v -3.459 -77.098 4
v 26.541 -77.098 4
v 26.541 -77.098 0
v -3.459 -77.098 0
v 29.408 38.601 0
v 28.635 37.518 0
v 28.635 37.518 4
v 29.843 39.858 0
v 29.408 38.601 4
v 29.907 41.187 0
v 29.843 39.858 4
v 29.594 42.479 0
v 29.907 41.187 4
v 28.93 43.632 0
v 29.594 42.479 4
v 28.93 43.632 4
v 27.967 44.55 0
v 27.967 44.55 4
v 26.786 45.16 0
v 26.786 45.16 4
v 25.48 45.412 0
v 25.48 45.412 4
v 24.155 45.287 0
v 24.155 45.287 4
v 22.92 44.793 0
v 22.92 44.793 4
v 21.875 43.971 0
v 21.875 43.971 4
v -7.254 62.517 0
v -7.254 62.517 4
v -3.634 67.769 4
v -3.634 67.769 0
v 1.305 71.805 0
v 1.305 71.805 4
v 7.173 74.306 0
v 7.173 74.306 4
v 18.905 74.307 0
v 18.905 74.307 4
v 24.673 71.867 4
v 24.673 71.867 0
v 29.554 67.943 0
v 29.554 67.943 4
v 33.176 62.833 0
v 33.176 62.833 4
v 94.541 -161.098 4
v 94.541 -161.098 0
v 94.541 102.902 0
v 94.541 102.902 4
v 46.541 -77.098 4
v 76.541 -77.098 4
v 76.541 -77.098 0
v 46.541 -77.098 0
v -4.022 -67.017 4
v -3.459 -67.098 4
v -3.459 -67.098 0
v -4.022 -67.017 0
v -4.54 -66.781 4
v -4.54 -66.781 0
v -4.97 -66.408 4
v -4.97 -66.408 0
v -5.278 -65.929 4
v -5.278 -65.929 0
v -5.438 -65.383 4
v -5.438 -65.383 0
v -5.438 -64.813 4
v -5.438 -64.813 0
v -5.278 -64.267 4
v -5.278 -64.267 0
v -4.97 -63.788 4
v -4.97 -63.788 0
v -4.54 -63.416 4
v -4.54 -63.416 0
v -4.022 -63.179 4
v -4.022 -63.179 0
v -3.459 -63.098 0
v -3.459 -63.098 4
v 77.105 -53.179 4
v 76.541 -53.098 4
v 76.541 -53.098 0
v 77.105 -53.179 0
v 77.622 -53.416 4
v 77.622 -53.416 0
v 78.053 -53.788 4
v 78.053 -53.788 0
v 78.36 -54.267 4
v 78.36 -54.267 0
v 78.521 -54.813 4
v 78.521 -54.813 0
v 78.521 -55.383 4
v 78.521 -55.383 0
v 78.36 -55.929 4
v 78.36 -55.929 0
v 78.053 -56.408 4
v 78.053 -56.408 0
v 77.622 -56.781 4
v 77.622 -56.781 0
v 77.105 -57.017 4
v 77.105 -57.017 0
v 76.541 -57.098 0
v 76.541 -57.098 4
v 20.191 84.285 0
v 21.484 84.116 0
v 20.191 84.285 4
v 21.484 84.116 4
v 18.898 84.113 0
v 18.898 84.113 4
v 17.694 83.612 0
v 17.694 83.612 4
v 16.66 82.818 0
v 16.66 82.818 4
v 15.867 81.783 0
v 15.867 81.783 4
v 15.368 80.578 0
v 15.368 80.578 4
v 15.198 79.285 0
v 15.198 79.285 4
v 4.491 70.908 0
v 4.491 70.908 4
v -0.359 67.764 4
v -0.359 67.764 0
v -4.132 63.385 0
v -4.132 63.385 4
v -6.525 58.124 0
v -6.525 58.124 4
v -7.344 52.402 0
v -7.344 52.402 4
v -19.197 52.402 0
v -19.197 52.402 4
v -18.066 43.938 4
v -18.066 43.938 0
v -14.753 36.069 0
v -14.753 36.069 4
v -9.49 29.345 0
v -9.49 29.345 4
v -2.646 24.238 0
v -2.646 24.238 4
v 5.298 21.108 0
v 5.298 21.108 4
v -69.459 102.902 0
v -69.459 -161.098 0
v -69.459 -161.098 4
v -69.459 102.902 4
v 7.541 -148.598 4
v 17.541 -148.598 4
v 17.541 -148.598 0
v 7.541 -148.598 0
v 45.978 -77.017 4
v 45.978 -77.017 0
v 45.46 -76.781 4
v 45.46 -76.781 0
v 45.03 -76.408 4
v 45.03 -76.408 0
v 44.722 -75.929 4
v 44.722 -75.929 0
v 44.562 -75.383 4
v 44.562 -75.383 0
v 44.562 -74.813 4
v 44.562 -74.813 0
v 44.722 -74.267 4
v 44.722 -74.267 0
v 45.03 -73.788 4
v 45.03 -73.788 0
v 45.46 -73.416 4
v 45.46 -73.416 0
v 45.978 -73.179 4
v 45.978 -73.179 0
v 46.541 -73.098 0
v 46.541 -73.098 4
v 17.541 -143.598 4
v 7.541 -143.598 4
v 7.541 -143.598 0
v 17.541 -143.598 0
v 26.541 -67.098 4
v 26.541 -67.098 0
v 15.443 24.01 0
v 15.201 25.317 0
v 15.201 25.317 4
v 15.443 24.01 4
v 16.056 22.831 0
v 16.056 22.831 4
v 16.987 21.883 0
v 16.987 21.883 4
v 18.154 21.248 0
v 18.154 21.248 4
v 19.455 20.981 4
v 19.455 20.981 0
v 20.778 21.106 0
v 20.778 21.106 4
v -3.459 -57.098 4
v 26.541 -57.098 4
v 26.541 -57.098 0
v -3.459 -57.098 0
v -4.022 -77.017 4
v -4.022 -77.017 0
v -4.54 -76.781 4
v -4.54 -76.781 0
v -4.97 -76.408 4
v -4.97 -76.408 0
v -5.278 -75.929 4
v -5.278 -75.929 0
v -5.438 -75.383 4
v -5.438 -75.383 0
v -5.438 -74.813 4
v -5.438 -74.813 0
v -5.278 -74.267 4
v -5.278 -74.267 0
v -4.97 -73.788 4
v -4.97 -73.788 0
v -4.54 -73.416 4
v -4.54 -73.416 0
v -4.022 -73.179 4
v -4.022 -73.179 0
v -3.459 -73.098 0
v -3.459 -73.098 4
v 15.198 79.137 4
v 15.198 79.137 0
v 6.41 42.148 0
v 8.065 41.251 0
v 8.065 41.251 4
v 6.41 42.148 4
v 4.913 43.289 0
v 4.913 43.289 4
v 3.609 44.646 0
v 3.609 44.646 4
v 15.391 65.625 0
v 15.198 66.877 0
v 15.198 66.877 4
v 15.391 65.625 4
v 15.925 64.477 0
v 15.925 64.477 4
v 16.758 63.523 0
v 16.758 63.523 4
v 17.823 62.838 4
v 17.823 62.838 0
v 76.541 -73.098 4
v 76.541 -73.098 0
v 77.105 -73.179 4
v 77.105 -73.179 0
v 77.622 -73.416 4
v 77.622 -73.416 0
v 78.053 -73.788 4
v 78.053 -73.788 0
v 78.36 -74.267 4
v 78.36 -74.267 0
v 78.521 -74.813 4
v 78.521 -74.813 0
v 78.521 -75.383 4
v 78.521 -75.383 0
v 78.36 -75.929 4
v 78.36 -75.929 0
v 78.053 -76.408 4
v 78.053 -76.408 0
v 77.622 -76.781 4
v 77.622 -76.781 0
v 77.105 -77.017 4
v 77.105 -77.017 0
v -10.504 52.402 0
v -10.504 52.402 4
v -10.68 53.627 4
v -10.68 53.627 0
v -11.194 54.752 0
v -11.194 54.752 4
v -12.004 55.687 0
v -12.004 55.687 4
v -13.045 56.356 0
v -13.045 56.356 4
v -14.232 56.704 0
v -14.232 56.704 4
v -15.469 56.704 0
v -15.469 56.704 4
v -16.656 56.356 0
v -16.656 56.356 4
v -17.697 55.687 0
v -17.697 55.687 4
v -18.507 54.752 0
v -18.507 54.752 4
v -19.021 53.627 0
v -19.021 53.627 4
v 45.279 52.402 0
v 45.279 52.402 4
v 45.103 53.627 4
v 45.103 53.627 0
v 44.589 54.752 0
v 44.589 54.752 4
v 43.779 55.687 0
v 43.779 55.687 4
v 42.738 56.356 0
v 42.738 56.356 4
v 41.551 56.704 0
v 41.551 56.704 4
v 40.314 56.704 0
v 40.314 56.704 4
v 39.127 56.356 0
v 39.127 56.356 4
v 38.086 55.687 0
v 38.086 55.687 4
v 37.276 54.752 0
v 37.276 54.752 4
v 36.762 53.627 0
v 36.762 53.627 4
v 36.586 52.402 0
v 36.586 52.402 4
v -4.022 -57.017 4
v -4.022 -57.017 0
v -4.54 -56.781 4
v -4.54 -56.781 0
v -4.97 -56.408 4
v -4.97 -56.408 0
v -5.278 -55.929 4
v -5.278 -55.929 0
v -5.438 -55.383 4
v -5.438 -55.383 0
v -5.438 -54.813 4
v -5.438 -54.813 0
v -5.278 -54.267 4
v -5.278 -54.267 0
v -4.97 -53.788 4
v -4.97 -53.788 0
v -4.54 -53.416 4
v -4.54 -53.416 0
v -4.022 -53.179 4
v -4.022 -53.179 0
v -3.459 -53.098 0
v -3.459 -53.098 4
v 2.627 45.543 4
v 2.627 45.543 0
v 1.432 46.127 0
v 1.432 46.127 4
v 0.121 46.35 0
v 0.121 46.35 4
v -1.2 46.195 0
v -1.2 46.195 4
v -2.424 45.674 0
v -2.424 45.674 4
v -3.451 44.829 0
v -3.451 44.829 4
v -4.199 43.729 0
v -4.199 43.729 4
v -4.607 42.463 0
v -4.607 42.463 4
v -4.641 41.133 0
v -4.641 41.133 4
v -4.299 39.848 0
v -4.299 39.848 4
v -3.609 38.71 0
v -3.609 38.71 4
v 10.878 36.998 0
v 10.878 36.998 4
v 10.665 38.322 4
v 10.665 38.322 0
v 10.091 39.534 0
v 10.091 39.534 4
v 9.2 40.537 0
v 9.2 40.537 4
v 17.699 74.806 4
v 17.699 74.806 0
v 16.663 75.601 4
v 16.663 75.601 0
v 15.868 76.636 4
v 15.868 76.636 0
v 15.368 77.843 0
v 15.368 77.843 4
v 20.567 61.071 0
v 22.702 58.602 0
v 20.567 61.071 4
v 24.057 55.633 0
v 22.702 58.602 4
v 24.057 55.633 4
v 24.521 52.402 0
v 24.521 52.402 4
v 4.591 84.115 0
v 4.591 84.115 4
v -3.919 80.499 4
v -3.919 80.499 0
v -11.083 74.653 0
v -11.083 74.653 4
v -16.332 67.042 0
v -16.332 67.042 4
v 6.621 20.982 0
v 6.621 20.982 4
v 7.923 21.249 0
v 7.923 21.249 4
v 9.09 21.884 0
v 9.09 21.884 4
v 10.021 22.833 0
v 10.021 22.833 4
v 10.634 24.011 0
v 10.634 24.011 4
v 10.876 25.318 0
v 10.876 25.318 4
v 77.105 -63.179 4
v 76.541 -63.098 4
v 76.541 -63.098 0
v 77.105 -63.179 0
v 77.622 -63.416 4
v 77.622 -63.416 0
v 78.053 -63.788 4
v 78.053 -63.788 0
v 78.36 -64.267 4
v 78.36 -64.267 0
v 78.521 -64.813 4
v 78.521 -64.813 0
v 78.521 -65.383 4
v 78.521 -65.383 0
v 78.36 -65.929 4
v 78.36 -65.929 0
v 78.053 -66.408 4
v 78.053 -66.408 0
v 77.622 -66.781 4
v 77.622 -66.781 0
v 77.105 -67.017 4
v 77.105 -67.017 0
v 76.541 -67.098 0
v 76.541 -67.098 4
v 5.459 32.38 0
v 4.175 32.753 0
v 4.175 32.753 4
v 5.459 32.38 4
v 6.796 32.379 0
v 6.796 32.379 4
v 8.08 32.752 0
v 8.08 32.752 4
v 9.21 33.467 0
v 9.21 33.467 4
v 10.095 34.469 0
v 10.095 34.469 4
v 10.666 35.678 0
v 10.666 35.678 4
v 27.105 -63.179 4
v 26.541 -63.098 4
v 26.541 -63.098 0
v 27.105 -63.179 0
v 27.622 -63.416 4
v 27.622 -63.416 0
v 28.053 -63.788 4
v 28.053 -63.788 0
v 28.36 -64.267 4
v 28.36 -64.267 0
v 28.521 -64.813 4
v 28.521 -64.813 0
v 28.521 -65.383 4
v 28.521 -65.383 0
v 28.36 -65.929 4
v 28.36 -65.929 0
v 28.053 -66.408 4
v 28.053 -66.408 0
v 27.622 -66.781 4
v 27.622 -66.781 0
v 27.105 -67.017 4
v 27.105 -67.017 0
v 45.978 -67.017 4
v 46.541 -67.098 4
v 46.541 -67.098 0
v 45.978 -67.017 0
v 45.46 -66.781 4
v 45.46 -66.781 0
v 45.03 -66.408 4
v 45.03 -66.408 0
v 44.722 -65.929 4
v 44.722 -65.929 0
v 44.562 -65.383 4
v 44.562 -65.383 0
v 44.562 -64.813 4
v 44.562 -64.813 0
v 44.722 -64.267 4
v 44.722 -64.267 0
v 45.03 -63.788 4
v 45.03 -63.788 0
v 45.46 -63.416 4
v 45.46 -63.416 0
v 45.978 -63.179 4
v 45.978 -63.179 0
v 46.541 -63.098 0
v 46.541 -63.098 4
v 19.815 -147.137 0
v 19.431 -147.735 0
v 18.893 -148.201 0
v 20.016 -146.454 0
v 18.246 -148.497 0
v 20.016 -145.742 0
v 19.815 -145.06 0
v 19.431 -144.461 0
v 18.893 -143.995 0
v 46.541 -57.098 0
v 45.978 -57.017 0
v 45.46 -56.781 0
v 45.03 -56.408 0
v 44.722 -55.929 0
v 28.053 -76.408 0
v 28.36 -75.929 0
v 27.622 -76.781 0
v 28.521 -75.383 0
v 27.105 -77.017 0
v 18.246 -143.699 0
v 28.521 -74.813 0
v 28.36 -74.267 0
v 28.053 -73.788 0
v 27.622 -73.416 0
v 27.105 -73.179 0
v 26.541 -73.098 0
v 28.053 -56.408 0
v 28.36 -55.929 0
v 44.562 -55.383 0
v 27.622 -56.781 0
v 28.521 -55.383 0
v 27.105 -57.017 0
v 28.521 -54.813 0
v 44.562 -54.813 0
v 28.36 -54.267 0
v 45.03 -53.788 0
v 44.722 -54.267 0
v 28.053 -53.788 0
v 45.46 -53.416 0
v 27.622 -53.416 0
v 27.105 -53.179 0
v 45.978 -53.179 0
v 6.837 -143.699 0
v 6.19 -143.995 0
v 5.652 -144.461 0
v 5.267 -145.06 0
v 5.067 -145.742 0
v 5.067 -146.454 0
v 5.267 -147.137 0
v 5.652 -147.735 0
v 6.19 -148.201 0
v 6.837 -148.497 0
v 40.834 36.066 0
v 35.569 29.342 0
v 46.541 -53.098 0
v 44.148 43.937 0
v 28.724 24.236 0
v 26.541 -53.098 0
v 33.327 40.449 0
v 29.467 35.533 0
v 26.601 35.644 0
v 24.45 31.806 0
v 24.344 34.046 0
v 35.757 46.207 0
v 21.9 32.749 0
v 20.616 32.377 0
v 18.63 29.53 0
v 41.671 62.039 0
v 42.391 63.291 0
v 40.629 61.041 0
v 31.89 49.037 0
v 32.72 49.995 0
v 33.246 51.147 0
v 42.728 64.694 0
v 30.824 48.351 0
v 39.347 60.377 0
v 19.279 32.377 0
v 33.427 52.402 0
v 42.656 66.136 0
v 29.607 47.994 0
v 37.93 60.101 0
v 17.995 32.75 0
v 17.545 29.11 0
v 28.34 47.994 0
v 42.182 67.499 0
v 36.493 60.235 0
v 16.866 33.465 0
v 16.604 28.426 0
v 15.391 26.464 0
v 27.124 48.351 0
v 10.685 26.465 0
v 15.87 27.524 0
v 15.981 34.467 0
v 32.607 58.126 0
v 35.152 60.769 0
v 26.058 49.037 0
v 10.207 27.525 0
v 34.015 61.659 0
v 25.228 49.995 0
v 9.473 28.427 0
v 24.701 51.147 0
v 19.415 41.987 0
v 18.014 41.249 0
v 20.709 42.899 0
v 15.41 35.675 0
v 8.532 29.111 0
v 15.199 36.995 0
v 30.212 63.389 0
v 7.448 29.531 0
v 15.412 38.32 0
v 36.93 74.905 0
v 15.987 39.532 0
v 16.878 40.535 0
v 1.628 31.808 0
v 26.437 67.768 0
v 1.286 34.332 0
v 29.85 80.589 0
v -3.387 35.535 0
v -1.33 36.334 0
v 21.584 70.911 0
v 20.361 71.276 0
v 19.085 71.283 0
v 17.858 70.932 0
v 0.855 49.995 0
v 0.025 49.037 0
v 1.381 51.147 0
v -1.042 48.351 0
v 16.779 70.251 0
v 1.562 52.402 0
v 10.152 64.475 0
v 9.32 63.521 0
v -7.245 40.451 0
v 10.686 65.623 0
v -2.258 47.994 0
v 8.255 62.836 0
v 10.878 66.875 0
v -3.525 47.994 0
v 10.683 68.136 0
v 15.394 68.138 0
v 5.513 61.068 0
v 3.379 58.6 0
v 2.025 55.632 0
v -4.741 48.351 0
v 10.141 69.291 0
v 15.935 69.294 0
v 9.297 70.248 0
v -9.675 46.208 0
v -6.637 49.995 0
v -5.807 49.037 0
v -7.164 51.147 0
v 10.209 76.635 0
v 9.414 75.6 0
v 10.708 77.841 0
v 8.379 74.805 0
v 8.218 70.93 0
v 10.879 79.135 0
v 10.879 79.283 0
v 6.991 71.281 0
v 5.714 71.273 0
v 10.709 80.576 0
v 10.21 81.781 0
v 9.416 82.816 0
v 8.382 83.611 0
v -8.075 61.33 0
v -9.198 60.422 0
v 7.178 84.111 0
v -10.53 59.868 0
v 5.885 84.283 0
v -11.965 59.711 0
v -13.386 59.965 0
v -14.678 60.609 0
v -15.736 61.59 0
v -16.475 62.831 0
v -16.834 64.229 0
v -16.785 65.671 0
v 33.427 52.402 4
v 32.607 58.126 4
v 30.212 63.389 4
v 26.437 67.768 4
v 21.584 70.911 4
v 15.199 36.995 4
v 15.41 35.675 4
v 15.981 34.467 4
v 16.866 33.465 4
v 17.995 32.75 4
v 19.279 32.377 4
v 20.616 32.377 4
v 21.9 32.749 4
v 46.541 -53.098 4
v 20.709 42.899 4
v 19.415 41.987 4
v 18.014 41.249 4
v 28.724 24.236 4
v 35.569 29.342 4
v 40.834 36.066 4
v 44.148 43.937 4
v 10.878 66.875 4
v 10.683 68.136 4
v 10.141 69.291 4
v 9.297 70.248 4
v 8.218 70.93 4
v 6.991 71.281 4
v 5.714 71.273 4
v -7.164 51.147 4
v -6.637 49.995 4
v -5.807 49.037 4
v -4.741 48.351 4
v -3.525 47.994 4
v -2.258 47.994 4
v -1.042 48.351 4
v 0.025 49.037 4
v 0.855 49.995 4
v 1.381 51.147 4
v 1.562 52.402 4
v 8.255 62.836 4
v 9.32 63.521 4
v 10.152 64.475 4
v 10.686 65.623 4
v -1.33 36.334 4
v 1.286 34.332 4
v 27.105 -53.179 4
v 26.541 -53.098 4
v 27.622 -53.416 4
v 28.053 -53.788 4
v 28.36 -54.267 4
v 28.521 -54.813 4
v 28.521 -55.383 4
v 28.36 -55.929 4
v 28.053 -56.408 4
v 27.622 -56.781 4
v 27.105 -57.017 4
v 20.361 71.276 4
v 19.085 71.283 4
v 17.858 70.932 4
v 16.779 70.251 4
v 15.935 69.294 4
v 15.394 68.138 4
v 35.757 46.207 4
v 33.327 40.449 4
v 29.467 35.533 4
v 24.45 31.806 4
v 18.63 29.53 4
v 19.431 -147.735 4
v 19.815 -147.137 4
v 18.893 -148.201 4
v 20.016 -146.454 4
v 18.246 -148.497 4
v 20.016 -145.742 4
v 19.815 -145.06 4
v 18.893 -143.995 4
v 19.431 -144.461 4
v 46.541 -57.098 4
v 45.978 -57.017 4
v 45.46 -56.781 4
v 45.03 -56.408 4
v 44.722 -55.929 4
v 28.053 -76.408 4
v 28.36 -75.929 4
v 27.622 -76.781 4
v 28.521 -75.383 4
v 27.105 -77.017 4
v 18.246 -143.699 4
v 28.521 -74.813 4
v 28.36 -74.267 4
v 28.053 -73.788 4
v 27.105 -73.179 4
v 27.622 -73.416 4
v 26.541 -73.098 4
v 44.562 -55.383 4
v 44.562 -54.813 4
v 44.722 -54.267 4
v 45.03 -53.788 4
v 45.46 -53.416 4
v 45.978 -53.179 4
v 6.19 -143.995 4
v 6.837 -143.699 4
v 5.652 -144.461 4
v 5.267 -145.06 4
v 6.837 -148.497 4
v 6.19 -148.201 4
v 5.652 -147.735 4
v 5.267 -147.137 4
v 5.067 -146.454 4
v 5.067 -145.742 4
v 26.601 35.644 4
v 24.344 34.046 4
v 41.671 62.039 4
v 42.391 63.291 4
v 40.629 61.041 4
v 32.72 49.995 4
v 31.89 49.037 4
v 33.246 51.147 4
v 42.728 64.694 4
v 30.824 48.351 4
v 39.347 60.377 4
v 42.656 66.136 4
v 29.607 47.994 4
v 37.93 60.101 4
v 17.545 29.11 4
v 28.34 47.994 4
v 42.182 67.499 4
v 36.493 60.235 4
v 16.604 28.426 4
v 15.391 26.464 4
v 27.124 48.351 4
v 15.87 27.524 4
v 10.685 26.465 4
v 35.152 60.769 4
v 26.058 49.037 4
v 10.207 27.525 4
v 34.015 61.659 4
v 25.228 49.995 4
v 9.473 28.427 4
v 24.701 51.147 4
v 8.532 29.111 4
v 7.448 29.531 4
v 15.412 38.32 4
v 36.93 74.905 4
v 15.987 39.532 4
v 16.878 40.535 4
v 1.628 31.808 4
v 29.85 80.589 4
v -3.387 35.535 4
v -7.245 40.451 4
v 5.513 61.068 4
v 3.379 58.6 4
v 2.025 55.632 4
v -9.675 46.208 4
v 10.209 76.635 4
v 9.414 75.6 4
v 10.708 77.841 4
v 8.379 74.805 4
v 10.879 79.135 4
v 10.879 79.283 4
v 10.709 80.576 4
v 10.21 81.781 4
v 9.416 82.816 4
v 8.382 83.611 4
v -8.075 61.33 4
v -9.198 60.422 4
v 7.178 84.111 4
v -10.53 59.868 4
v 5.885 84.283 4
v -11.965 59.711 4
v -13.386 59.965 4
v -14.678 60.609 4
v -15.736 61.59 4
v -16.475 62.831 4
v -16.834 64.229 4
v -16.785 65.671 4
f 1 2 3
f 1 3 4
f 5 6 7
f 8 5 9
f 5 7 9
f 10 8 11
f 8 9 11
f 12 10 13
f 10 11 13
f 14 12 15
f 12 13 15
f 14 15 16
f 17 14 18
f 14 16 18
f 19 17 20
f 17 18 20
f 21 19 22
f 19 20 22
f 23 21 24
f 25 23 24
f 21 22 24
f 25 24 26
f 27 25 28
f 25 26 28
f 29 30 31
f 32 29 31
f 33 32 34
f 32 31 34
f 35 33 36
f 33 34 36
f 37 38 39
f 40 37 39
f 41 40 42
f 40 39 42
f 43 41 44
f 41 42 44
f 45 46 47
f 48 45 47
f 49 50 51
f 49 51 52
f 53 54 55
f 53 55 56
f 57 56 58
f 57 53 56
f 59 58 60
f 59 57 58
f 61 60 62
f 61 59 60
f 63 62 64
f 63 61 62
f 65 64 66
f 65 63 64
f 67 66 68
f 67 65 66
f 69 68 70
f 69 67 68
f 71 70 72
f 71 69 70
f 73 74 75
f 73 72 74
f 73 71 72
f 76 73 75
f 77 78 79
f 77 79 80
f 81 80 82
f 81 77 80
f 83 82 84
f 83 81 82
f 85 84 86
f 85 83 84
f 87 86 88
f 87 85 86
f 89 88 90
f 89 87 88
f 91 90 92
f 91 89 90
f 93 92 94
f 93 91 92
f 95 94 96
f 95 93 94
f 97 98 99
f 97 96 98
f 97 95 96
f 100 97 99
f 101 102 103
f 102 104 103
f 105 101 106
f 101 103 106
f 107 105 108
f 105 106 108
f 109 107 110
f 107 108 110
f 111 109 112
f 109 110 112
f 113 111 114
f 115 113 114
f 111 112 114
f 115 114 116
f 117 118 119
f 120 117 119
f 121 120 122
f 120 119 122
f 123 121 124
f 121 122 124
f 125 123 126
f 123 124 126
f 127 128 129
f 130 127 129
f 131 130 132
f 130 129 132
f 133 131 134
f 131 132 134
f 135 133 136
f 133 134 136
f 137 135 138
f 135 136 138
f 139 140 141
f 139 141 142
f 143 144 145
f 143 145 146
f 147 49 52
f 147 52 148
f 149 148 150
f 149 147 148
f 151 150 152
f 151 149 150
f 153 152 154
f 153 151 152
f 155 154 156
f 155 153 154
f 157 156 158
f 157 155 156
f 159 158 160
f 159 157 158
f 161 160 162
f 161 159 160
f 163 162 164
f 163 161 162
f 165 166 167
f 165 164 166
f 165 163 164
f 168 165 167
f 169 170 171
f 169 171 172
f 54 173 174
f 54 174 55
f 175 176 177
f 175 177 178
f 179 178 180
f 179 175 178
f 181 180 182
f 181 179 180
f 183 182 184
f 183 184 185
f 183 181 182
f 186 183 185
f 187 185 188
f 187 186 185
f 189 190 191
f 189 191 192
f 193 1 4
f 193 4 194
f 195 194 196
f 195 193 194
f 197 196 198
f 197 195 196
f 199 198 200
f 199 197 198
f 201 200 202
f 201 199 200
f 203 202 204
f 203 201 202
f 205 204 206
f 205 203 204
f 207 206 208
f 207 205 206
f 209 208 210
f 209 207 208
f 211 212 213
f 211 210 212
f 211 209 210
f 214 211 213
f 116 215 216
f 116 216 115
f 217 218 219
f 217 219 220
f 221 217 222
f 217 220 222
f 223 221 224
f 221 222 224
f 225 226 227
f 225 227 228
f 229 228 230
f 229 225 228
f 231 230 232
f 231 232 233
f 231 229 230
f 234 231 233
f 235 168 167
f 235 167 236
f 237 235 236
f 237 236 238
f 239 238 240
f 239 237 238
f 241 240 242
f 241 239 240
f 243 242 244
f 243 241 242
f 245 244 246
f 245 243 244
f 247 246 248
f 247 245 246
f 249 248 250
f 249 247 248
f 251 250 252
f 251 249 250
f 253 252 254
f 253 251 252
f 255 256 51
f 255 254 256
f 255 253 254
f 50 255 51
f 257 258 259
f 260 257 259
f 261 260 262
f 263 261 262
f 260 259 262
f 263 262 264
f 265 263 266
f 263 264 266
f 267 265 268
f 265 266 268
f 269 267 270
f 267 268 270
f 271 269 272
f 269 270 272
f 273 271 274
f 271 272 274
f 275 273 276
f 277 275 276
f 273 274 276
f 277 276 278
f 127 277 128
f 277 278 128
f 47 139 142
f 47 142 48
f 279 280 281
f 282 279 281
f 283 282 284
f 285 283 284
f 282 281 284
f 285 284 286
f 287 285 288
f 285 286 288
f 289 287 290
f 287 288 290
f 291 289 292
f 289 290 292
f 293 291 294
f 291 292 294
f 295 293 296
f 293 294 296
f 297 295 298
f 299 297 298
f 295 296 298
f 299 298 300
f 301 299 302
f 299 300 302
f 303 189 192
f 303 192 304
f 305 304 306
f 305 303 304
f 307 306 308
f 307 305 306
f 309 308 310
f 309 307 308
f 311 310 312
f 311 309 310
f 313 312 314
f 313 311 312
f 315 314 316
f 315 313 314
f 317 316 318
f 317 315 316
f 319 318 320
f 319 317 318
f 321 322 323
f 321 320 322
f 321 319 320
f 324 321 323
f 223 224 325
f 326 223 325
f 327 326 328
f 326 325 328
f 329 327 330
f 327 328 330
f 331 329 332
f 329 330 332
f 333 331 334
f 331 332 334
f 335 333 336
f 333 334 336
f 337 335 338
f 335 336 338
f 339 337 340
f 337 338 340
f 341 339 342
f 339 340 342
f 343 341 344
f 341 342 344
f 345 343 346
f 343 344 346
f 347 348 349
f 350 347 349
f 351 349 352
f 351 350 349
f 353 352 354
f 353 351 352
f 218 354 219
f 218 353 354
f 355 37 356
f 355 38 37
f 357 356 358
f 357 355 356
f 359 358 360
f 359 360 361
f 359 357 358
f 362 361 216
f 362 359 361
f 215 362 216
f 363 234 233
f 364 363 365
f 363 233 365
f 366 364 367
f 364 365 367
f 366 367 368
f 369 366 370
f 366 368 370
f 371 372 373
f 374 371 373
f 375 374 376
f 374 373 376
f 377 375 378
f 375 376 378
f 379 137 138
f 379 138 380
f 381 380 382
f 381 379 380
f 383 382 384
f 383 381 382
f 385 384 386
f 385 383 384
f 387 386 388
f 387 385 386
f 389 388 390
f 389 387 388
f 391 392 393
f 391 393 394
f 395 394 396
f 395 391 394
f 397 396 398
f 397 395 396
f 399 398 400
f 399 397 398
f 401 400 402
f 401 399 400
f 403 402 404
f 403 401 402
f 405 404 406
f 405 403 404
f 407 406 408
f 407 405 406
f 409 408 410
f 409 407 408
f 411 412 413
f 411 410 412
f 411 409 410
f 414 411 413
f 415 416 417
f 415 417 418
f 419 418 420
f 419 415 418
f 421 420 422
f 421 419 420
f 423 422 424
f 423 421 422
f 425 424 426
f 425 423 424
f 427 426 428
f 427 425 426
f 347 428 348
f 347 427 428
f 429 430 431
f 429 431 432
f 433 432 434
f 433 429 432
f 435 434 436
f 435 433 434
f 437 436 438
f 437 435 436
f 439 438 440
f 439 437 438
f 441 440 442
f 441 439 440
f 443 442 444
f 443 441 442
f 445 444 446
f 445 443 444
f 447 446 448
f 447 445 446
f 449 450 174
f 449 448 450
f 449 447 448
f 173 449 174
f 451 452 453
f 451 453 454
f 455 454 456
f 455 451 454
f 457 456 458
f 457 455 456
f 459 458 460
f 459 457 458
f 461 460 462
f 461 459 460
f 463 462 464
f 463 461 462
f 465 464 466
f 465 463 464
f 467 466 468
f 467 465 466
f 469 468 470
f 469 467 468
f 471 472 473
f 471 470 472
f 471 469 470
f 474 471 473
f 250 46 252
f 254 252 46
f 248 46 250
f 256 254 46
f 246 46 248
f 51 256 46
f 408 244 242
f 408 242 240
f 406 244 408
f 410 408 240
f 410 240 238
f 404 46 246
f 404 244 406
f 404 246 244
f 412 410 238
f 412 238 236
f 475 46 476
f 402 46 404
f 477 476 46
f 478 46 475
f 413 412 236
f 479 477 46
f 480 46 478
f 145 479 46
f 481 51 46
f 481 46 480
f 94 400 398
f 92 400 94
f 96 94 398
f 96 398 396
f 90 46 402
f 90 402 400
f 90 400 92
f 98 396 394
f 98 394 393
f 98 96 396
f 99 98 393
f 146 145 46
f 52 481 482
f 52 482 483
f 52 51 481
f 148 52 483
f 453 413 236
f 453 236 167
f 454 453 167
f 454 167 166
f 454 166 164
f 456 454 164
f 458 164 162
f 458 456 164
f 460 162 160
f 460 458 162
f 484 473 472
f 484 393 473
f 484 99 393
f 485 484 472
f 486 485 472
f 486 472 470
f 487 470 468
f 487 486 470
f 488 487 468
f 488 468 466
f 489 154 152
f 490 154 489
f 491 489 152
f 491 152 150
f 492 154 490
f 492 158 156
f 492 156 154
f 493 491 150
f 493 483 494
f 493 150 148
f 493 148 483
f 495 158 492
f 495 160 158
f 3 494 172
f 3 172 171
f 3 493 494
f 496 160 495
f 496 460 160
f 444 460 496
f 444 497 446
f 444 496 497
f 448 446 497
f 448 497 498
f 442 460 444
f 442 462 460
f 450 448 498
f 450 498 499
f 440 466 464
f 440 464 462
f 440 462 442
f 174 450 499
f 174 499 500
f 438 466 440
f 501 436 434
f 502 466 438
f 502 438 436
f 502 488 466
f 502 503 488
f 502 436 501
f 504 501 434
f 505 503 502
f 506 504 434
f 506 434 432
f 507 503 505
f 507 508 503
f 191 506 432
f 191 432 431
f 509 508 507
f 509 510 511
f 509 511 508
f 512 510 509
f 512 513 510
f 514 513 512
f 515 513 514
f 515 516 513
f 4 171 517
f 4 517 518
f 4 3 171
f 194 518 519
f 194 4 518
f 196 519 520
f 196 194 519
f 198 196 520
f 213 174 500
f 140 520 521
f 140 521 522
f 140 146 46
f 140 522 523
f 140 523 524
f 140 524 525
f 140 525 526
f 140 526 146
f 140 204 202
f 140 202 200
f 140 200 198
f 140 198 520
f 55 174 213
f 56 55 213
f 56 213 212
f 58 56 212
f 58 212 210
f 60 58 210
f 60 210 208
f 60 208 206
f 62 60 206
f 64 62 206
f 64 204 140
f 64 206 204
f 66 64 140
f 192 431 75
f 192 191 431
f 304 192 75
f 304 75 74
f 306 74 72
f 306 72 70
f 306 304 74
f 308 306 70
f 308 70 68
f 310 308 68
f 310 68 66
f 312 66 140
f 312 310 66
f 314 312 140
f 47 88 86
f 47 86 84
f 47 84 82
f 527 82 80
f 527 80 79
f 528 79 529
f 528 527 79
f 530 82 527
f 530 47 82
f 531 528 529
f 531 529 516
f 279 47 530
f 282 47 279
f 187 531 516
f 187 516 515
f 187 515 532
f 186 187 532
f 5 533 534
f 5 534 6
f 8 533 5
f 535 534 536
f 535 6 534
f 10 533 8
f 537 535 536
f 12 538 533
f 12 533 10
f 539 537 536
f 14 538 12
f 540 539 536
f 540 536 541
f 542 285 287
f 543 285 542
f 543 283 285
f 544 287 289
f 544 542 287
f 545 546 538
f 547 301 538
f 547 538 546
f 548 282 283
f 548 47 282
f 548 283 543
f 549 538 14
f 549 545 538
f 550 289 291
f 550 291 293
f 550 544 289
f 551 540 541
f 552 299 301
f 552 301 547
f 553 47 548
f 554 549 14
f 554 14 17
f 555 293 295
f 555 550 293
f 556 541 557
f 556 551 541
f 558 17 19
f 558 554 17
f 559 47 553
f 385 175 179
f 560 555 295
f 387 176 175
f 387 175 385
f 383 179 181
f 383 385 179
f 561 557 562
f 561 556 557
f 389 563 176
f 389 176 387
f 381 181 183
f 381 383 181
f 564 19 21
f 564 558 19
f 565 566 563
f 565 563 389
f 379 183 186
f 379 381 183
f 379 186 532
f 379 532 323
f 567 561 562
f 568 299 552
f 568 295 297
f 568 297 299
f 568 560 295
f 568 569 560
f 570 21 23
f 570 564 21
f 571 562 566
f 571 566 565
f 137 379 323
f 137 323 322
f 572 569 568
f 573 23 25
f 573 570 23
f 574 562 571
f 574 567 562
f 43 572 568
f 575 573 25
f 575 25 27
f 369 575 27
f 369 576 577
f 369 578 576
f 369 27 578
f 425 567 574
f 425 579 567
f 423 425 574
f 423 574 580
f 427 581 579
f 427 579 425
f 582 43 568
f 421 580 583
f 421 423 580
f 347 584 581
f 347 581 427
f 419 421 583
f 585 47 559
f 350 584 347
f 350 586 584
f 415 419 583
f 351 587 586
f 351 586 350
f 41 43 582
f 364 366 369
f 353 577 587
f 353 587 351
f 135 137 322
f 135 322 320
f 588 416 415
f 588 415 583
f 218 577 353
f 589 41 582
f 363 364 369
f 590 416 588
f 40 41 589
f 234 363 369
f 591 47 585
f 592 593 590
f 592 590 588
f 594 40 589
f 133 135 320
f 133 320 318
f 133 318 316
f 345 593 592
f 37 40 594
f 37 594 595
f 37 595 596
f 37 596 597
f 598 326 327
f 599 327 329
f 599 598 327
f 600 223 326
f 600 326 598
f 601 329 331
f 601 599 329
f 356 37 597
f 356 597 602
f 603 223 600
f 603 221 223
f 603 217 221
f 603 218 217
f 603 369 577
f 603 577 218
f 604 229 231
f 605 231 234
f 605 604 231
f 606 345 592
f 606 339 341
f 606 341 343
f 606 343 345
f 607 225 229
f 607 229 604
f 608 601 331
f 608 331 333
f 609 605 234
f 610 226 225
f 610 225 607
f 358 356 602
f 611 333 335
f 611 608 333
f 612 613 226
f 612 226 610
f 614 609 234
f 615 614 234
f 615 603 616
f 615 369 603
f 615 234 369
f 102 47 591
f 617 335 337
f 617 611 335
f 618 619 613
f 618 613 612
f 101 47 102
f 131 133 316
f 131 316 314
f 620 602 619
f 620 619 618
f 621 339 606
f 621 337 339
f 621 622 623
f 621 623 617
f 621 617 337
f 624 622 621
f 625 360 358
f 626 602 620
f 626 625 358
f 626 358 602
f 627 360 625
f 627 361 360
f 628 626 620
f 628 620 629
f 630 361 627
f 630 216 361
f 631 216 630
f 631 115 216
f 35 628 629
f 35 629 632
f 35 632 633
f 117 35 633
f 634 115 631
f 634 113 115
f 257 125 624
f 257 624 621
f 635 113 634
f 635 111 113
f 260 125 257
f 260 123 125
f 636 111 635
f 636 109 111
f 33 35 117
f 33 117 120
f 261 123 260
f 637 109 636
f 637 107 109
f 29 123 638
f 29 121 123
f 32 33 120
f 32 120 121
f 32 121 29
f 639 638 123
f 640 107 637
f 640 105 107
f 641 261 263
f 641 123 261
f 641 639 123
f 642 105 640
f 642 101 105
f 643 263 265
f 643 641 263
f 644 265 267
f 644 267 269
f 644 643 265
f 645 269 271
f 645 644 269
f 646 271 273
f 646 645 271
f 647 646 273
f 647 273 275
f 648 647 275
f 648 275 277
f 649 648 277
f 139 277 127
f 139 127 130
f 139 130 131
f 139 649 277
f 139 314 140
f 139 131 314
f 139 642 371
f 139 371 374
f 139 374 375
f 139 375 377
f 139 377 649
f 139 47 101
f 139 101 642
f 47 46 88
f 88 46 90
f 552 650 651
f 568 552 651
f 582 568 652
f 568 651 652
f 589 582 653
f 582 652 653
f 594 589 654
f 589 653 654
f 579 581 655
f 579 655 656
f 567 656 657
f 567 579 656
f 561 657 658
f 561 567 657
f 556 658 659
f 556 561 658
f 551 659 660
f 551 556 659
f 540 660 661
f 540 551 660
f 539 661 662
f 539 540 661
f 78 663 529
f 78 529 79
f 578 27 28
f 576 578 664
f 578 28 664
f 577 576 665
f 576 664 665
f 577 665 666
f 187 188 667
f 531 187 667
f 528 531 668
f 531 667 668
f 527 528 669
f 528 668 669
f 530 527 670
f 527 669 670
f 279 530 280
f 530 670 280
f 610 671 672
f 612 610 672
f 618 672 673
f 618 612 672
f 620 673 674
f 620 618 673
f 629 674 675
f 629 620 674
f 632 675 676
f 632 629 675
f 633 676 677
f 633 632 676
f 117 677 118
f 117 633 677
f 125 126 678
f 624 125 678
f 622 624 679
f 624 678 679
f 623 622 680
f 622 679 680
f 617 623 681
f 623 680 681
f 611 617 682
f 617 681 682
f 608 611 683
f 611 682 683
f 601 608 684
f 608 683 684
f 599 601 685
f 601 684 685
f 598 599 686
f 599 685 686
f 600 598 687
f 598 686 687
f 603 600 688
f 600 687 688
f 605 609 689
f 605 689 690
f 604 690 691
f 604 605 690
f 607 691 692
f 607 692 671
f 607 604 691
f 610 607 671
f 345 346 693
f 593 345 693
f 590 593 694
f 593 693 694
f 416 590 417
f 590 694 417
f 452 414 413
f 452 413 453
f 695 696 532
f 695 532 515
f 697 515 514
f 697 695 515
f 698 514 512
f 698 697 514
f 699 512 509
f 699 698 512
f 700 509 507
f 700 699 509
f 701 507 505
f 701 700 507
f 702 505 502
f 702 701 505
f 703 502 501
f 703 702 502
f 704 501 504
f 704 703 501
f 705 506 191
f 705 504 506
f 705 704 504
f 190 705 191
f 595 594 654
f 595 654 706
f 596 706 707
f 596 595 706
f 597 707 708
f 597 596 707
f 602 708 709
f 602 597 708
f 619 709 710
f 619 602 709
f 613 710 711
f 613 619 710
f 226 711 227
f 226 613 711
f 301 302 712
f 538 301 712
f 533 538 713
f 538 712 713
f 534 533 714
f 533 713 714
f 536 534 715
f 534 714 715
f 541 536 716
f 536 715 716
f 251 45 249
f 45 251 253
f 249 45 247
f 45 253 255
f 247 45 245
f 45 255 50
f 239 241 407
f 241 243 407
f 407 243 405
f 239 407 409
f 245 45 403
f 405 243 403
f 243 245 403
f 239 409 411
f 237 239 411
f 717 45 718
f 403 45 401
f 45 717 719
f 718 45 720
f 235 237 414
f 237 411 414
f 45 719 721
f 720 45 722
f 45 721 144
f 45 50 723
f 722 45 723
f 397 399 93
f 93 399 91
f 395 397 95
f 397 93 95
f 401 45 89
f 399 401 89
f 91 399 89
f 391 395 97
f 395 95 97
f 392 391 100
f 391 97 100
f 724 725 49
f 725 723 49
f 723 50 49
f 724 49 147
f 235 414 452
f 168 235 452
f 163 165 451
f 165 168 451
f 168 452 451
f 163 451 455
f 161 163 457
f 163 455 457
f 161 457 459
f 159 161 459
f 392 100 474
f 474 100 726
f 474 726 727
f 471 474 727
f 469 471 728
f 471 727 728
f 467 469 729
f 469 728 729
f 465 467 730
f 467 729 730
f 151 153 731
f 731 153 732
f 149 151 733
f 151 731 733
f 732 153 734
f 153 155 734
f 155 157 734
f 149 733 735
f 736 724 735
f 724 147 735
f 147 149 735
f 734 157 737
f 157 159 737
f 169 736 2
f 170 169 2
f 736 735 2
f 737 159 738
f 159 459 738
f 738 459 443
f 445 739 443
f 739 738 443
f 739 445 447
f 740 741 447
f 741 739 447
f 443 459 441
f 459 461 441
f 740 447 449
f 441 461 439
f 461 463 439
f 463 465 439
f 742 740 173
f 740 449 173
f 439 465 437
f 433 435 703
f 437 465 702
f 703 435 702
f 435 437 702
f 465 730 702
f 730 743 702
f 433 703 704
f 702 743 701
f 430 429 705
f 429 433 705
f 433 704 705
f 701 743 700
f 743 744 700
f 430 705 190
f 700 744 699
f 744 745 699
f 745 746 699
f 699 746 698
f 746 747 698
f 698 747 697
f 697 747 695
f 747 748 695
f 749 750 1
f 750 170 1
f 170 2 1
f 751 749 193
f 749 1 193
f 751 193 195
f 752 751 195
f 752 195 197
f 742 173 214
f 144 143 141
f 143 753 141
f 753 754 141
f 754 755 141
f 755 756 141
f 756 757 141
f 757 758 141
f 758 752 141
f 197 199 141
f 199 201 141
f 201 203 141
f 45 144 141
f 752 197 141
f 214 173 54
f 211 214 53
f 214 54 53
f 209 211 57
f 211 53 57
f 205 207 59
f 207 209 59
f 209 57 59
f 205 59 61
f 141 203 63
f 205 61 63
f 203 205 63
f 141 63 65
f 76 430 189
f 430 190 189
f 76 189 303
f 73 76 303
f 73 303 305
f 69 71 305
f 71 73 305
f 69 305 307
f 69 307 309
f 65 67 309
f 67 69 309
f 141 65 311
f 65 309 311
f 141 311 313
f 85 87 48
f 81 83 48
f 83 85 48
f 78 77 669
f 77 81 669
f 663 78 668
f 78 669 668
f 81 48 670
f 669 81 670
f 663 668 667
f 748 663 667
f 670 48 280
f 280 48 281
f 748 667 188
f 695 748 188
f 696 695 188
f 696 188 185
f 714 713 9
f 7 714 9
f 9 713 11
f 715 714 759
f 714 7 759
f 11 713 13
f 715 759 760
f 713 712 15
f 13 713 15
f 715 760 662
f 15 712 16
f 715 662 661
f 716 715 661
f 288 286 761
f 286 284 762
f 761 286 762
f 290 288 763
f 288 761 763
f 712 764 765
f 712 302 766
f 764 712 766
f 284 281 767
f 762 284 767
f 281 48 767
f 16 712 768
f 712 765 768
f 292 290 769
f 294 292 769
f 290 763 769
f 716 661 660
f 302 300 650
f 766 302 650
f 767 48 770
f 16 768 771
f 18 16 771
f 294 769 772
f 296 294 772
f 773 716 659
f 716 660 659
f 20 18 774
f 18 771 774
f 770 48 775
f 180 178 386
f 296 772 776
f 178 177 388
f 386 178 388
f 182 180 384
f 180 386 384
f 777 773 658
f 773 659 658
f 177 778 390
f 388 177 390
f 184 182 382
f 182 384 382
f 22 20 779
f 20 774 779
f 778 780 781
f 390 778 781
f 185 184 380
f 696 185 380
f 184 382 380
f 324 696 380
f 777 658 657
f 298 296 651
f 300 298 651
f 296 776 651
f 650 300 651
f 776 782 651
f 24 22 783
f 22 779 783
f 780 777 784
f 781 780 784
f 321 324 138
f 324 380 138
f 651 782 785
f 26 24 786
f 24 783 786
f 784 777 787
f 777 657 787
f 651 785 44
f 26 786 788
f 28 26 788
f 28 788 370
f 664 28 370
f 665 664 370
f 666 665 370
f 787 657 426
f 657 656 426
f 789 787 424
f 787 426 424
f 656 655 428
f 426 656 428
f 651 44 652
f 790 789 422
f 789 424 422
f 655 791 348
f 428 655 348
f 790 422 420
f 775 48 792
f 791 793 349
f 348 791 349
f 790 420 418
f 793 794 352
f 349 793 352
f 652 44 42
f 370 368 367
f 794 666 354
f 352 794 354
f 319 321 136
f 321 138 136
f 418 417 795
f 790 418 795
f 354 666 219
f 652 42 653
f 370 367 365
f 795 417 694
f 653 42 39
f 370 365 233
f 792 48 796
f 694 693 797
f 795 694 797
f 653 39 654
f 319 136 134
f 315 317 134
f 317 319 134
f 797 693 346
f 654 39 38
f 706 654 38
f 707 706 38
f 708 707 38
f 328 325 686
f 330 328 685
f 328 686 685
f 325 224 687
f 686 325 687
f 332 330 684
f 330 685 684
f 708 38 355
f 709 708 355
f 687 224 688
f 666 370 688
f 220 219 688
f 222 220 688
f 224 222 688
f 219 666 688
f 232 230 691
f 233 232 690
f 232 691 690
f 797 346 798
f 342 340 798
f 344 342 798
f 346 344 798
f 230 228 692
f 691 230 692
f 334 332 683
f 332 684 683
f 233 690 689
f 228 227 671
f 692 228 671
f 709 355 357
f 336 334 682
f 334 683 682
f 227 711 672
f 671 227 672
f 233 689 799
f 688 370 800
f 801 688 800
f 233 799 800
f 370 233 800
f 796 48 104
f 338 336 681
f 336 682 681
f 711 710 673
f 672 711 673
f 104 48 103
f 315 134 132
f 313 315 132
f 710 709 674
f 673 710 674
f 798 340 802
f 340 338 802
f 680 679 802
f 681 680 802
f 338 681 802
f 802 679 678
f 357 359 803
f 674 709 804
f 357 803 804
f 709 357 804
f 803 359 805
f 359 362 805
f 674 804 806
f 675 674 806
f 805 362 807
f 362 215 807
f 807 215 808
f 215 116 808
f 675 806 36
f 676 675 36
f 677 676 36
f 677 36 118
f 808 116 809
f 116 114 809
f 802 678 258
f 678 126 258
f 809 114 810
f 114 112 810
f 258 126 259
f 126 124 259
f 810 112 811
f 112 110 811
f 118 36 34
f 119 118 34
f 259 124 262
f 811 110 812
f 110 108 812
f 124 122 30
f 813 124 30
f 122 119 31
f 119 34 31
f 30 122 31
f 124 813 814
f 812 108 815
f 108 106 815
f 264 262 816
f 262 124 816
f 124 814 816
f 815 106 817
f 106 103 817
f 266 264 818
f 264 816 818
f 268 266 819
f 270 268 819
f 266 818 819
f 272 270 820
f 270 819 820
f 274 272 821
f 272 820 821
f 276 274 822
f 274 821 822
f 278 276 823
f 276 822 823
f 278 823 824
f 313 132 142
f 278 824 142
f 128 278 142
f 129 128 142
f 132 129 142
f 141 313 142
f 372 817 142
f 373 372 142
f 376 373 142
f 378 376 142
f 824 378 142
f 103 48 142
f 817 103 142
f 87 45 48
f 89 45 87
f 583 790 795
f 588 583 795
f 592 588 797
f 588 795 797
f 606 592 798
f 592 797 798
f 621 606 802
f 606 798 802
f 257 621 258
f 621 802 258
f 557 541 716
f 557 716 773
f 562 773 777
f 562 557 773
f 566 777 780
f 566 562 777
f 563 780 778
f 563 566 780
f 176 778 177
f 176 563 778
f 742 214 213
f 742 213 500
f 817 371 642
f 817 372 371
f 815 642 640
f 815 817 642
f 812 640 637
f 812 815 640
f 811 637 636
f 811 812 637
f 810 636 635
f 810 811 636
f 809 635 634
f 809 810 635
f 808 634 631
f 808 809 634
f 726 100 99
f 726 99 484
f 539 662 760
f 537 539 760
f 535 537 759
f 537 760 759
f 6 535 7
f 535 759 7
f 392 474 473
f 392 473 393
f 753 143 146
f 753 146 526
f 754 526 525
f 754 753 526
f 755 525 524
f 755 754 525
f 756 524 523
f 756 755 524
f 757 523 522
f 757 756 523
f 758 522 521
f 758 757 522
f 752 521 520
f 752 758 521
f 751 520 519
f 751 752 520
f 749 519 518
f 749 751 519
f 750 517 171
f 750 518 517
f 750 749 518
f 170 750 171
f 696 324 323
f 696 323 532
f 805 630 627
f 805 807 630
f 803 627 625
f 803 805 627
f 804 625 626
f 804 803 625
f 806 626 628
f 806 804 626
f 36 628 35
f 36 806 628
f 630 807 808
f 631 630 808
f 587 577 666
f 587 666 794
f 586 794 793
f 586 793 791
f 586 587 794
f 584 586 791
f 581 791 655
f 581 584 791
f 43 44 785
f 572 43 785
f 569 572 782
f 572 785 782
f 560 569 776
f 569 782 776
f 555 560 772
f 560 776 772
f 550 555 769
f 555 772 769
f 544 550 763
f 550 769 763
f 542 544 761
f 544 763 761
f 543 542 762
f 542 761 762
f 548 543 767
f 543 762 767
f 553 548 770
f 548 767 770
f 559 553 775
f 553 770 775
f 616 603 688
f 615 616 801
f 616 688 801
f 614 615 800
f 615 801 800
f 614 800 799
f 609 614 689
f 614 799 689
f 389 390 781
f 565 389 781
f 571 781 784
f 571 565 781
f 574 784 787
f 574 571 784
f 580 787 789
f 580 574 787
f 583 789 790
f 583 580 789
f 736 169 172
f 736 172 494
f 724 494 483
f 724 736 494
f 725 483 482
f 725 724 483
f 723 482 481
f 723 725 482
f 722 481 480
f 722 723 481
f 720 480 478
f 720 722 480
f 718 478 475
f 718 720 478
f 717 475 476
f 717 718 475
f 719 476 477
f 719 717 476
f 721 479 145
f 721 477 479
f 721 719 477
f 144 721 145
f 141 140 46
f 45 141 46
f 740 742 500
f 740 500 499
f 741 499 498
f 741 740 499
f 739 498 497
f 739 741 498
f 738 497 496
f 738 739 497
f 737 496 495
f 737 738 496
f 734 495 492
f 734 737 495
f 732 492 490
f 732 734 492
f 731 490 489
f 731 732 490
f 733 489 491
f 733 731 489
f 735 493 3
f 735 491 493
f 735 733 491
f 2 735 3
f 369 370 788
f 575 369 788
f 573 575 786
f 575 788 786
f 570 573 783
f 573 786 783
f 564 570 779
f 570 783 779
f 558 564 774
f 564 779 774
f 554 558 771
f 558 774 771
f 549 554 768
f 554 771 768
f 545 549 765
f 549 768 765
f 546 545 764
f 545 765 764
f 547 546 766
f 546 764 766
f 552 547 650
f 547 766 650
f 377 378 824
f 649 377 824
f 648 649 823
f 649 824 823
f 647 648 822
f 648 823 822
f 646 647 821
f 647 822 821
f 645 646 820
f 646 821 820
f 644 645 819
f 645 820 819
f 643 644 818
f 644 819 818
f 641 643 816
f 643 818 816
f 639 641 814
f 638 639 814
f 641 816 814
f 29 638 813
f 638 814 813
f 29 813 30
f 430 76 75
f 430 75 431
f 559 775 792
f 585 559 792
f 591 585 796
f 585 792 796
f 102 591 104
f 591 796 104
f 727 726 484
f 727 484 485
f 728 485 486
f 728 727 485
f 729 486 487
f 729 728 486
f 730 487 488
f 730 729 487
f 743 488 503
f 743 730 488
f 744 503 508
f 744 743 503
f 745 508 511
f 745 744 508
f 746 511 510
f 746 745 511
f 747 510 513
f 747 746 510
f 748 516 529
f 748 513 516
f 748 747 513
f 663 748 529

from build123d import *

# Parameters (mm, degrees)
SKETCH1_W            = 164
SKETCH1_H            = 264
BOSS_EXTRUDE1_DEPTH  = 4
CUT_EXTRUDE3_DEPTH   = 10
CUT_EXTRUDE4_DEPTH   = 10
LPATTERN1_COUNT      = 3
LPATTERN1_PITCH      = 10
LPATTERN1_COUNT_DIR2 = 2
LPATTERN1_PITCH_DIR2 = 50
CUT_EXTRUDE5_DEPTH   = 10
SKETCH5_W            = 4.319122357
SKETCH5_H            = 26.937684175
SKETCH5_H_2          = 25.730682063
BOSS_EXTRUDE2_DEPTH  = 4
FILLET3_R            = 5
FILLET4_R            = 5
FILLET5_R            = 4.5
FILLET6_R            = 4.5
FILLET7_R            = 4.75
FILLET8_R            = 4.75
FILLET9_R            = 4.5
FILLET10_R           = 4.5


with BuildPart() as part:
    # Sketch1 → Boss-Extrude1 (new body)
    with BuildSketch(Plane.XY):
        with Locations((12.541176471, -29.098039216)):
            Rectangle(SKETCH1_W, SKETCH1_H)
    extrude(amount=BOSS_EXTRUDE1_DEPTH)

    # Sketch2 → Cut-Extrude3 (cut)
    with BuildSketch(Plane.XY.offset(4)):
        with BuildLine():
            ThreePointArc((-19.196819428, 52.401960784), (13.041176471, 20.163964886), (45.279172369, 52.401960784))
            ThreePointArc((45.279172369, 52.401960784), (40.932647519, 56.748485634), (36.58612267, 52.401960784))
            ThreePointArc((36.58612267, 52.401960784), (13.041176471, 28.857014585), (-10.503769729, 52.401960784))
            ThreePointArc((-10.503769729, 52.401960784), (-14.850294578, 56.748485634), (-19.196819428, 52.401960784))
        make_face()
        with BuildLine():
            ThreePointArc((33.426584493, 52.401960784), (13.041176471, 72.787368807), (-7.344231552, 52.401960784))
            ThreePointArc((-7.344231552, 52.401960784), (-2.891363068, 47.949092301), (1.561505415, 52.401960784))
            ThreePointArc((1.561505415, 52.401960784), (13.041176471, 63.88163184), (24.520847526, 52.401960784))
            ThreePointArc((24.520847526, 52.401960784), (28.97371601, 47.949092301), (33.426584493, 52.401960784))
        make_face()
        with BuildLine():
            ThreePointArc((42.181568033, 67.499048907), (12.784631297, 85.219923468), (-16.331673874, 67.04163813))
            ThreePointArc((-16.331673874, 67.04163813), (-14.055015917, 60.240559274), (-7.253937061, 62.517217231))
            ThreePointArc((-7.253937061, 62.517217231), (12.863917084, 75.077467953), (33.17567306, 62.833264313))
            ThreePointArc((33.17567306, 62.833264313), (40.011512844, 60.663209124), (42.181568033, 67.499048907))
        make_face()
        with BuildLine():
            ThreePointArc((-3.609454357, 38.710399181), (12.244809645, 30.859719351), (28.635450382, 37.518379654))
            ThreePointArc((28.635450382, 37.518379654), (28.481389363, 44.125242049), (21.874526968, 43.97118103))
            ThreePointArc((21.874526968, 43.97118103), (12.590075808, 40.199393986), (3.609454357, 44.646398506))
            ThreePointArc((3.609454357, 44.646398506), (-2.967999663, 45.2878532), (-3.609454357, 38.710399181))
        make_face()
    extrude(amount=-CUT_EXTRUDE3_DEPTH, mode=Mode.SUBTRACT)

    # Sketch3 → Cut-Extrude4 (cut)
    with BuildSketch(Plane.XY.offset(4)):
        with BuildLine():
            Line((76.541176471, -57.098039216), (46.541176471, -57.098039216))
            ThreePointArc((46.541176471, -57.098039216), (44.541176471, -55.098039216), (46.541176471, -53.098039216))
            Line((46.541176471, -53.098039216), (76.541176471, -53.098039216))
            ThreePointArc((76.541176471, -53.098039216), (78.541176471, -55.098039216), (76.541176471, -57.098039216))
        make_face()
    cut_extrude4 = extrude(amount=-CUT_EXTRUDE4_DEPTH, mode=Mode.SUBTRACT)

    # LPattern1: Cut-Extrude4 3 × 2
    with Locations(*[(-j * LPATTERN1_PITCH_DIR2, -i * LPATTERN1_PITCH, 0) for i in range(LPATTERN1_COUNT) for j in range(LPATTERN1_COUNT_DIR2) if (i, j) != (0, 0)]):
        add(cut_extrude4, mode=Mode.SUBTRACT)

    # Sketch4 → Cut-Extrude5 (cut)
    with BuildSketch(Plane.XY.offset(4)):
        with BuildLine():
            Line((7.541176471, -143.598039216), (17.541176471, -143.598039216))
            ThreePointArc((17.541176471, -143.598039216), (20.041176471, -146.098039216), (17.541176471, -148.598039216))
            Line((17.541176471, -148.598039216), (7.541176471, -148.598039216))
            ThreePointArc((7.541176471, -148.598039216), (5.041176471, -146.098039216), (7.541176471, -143.598039216))
        make_face()
    extrude(amount=-CUT_EXTRUDE5_DEPTH, mode=Mode.SUBTRACT)

    # Sketch5 → Boss-Extrude2 (add)
    with BuildSketch(Plane.XY.offset(4)):
        with Locations((13.038358708, 73.546081582)):
            Rectangle(SKETCH5_W, SKETCH5_H)
        with Locations((13.038358708, 29.708086806)):
            Rectangle(SKETCH5_W, SKETCH5_H_2)
    extrude(amount=-BOSS_EXTRUDE2_DEPTH)

    # Fillet3
    fillet3_edges = [part.edges().sort_by_distance(p)[0] for p in [
        (15.197919886, 74.975363365, 2),
        (15.197919886, 85.149982831, 2),
    ]]
    fillet(fillet3_edges, radius=FILLET3_R)

    # Fillet4
    fillet4_edges = [part.edges().sort_by_distance(p)[0] for p in [
        (10.878797529, 74.974824217, 2),
        (10.878797529, 85.149611196, 2),
    ]]
    fillet(fillet4_edges, radius=FILLET4_R)

    # Fillet5
    # the kernel refuses this fillet: 4.5 mm, written as the material it adds along each edge
    with BuildSketch(Plane(origin=(10.878797529, 63.676133253, 0), x_dir=(-0.952400444463688, -0.3048497882324502, 0), z_dir=(0, 0, 1))) as fillet5_piece_1:
        with BuildLine():
            CenterArc((3.294924666, -4.467486403), FILLET5_R, 96.891689821, 65.359183141)
            Line((-0.990877334, -3.095662356), (0, 0))
            ThreePointArc((0, 0), (1.377478425, -0.082943423), (2.75495685, 0))
        make_face()
    extrude(amount=4)
    with BuildSketch(Plane(origin=(10.878797529, 72.672357366, 0), x_dir=(0, -1, 0), z_dir=(0, 0, 1))) as fillet5_piece_2:
        with BuildLine():
            CenterArc((5.849616613, -4.5), FILLET5_R, 90, 114.796867003)
            ThreePointArc((1.764514753, -6.387310996), (0.620984955, -3.265832826), (0, 0))
            Line((0, 0), (5.849616613, 0))
        make_face()
    extrude(amount=4)

    # Fillet6
    # the kernel refuses this fillet: 4.5 mm, written as the material it adds along each edge
    with BuildSketch(Plane(origin=(15.197919886, 72.672957753, 0), x_dir=(0.963984906204346, -0.2659569525509686, 0), z_dir=(0, 0, 1))) as fillet6_piece_1:
        with BuildLine():
            CenterArc((5.893145872, -4.440206052), FILLET6_R, 80.649344531, 114.774478291)
            Line((1.555213794, -5.637012339), (0, 0))
            ThreePointArc((0, 0), (3.312144479, 0.270872005), (6.624288959, 0))
        make_face()
    extrude(amount=4)
    with BuildSketch(Plane(origin=(15.197919886, 63.677212683, 0), x_dir=(0.9525356739175572, -0.30442698617965064, 0), z_dir=(0, 0, 1))) as fillet6_piece_2:
        with BuildLine():
            CenterArc((3.296449531, 4.467456192), FILLET6_R, 197.723693353, 65.381411924)
            Line((-0.989961002, 3.097534754), (0, 0))
            ThreePointArc((0, 0), (1.378115911, 0.083020491), (2.756231822, 0))
        make_face()
    extrude(amount=4)

    # Fillet7
    # the kernel refuses this fillet: 4.75 mm, written as the material it adds along each edge
    with BuildSketch(Plane(origin=(15.197919886, 30.953165389, 0), x_dir=(0, 1, 0), z_dir=(0, 0, 1))) as fillet7_piece_1:
        with BuildLine():
            CenterArc((6.126567217, -4.75), FILLET7_R, 90, 114.26424477)
            ThreePointArc((1.796182676, -6.701991222), (0.626677135, -3.423736603), (0, 0))
            Line((0, 0), (6.126567217, 0))
        make_face()
    extrude(amount=4)
    with BuildSketch(Plane(origin=(15.197919886, 40.383034621, 0), x_dir=(0.9557846908185708, 0.2940673813887714, 0), z_dir=(0, 0, 1))) as fillet7_piece_2:
        with BuildLine():
            CenterArc((3.51897249, -4.715313748), FILLET7_R, 96.928419065, 65.969959025)
            Line((-1.021004791, -3.318493687), (0, 0))
            ThreePointArc((0, 0), (1.472991805, -0.08916851), (2.94598361, 0))
        make_face()
    extrude(amount=4)

    # Fillet8
    # the kernel refuses this fillet: 4.75 mm, written as the material it adds along each edge
    with BuildSketch(Plane(origin=(10.878797529, 40.384047255, 0), x_dir=(0, -1, 0), z_dir=(0, 0, 1))) as fillet8_piece_1:
        with BuildLine():
            CenterArc((3.470508434, -4.75), FILLET8_R, 90, 65.949113414)
            ThreePointArc((-0.867114896, -2.814147772), (-0.348416422, -1.433308135), (0, 0))
            Line((0, 0), (3.470508434, 0))
        make_face()
    extrude(amount=4)
    with BuildSketch(Plane(origin=(10.878797529, 30.953732806, 0), x_dir=(-0.9658301221176608, 0.2591759541511984, 0), z_dir=(0, 0, 1))) as fillet8_piece_2:
        with BuildLine():
            CenterArc((6.176063632, -4.688044059), FILLET8_R, 80.735851864, 114.285319943)
            Line((1.588370552, -5.919129841), (0, 0))
            ThreePointArc((0, 0), (3.470374234, 0.281175054), (6.940748468, 0))
        make_face()
    extrude(amount=4)

    # Fillet9
    # the kernel refuses this fillet: 4.5 mm, written as the material it adds along each edge
    with BuildSketch(Plane(origin=(10.878797529, 20.23656794, 0), x_dir=(0, 1, 0), z_dir=(0, 0, 1))) as fillet9_piece_1:
        with BuildLine():
            CenterArc((5.239399394, 4.5), FILLET9_R, 166.10226732, 103.89773268)
            ThreePointArc((0.871132452, 5.58085333), (0.313102845, 2.809542348), (0, 0))
            Line((0, 0), (5.239399394, 0))
        make_face()
    extrude(amount=4)
    with BuildSketch(Plane(origin=(10.878797529, 28.956521807, 0), x_dir=(-0.9862681446857605, 0.16515189002281502, 0), z_dir=(0, 0, 1))) as fillet9_piece_2:
        with BuildLine():
            CenterArc((3.811181811, 4.487703929), FILLET9_R, 189.50605818, 76.257380527)
            Line((-0.62702484, 3.744520424), (0, 0))
            ThreePointArc((0, 0), (1.739373093, 0.064335629), (3.478746186, 0))
        make_face()
    extrude(amount=4)

    # Fillet10
    # the kernel refuses this fillet: 4.5 mm, written as the material it adds along each edge
    with BuildSketch(Plane(origin=(15.197919886, 20.236189577, 0), x_dir=(0.9880653050237032, 0.15403555761062557, 0), z_dir=(0, 0, 1))) as fillet10_piece_1:
        with BuildLine():
            CenterArc((5.253191268, 4.482705444), FILLET10_R, 171.139133949, 103.885741164)
            Line((0.806897395, 5.175865453), (0, 0))
            ThreePointArc((0, 0), (2.823669163, -0.123898184), (5.647338326, 0))
        make_face()
    extrude(amount=4)
    with BuildSketch(Plane(origin=(15.197919886, 28.956002724, 0), x_dir=(0.9863050503076972, 0.16493134249599425, 0), z_dir=(0, 0, 1))) as fillet10_piece_2:
        with BuildLine():
            CenterArc((3.812043631, -4.48769836), FILLET10_R, 94.237521054, 76.269232907)
            Line((-0.626329096, -3.745507319), (0, 0))
            ThreePointArc((0, 0), (1.739766416, -0.064364768), (3.479532832, 0))
        make_face()
    extrude(amount=4)


solid = part.part
